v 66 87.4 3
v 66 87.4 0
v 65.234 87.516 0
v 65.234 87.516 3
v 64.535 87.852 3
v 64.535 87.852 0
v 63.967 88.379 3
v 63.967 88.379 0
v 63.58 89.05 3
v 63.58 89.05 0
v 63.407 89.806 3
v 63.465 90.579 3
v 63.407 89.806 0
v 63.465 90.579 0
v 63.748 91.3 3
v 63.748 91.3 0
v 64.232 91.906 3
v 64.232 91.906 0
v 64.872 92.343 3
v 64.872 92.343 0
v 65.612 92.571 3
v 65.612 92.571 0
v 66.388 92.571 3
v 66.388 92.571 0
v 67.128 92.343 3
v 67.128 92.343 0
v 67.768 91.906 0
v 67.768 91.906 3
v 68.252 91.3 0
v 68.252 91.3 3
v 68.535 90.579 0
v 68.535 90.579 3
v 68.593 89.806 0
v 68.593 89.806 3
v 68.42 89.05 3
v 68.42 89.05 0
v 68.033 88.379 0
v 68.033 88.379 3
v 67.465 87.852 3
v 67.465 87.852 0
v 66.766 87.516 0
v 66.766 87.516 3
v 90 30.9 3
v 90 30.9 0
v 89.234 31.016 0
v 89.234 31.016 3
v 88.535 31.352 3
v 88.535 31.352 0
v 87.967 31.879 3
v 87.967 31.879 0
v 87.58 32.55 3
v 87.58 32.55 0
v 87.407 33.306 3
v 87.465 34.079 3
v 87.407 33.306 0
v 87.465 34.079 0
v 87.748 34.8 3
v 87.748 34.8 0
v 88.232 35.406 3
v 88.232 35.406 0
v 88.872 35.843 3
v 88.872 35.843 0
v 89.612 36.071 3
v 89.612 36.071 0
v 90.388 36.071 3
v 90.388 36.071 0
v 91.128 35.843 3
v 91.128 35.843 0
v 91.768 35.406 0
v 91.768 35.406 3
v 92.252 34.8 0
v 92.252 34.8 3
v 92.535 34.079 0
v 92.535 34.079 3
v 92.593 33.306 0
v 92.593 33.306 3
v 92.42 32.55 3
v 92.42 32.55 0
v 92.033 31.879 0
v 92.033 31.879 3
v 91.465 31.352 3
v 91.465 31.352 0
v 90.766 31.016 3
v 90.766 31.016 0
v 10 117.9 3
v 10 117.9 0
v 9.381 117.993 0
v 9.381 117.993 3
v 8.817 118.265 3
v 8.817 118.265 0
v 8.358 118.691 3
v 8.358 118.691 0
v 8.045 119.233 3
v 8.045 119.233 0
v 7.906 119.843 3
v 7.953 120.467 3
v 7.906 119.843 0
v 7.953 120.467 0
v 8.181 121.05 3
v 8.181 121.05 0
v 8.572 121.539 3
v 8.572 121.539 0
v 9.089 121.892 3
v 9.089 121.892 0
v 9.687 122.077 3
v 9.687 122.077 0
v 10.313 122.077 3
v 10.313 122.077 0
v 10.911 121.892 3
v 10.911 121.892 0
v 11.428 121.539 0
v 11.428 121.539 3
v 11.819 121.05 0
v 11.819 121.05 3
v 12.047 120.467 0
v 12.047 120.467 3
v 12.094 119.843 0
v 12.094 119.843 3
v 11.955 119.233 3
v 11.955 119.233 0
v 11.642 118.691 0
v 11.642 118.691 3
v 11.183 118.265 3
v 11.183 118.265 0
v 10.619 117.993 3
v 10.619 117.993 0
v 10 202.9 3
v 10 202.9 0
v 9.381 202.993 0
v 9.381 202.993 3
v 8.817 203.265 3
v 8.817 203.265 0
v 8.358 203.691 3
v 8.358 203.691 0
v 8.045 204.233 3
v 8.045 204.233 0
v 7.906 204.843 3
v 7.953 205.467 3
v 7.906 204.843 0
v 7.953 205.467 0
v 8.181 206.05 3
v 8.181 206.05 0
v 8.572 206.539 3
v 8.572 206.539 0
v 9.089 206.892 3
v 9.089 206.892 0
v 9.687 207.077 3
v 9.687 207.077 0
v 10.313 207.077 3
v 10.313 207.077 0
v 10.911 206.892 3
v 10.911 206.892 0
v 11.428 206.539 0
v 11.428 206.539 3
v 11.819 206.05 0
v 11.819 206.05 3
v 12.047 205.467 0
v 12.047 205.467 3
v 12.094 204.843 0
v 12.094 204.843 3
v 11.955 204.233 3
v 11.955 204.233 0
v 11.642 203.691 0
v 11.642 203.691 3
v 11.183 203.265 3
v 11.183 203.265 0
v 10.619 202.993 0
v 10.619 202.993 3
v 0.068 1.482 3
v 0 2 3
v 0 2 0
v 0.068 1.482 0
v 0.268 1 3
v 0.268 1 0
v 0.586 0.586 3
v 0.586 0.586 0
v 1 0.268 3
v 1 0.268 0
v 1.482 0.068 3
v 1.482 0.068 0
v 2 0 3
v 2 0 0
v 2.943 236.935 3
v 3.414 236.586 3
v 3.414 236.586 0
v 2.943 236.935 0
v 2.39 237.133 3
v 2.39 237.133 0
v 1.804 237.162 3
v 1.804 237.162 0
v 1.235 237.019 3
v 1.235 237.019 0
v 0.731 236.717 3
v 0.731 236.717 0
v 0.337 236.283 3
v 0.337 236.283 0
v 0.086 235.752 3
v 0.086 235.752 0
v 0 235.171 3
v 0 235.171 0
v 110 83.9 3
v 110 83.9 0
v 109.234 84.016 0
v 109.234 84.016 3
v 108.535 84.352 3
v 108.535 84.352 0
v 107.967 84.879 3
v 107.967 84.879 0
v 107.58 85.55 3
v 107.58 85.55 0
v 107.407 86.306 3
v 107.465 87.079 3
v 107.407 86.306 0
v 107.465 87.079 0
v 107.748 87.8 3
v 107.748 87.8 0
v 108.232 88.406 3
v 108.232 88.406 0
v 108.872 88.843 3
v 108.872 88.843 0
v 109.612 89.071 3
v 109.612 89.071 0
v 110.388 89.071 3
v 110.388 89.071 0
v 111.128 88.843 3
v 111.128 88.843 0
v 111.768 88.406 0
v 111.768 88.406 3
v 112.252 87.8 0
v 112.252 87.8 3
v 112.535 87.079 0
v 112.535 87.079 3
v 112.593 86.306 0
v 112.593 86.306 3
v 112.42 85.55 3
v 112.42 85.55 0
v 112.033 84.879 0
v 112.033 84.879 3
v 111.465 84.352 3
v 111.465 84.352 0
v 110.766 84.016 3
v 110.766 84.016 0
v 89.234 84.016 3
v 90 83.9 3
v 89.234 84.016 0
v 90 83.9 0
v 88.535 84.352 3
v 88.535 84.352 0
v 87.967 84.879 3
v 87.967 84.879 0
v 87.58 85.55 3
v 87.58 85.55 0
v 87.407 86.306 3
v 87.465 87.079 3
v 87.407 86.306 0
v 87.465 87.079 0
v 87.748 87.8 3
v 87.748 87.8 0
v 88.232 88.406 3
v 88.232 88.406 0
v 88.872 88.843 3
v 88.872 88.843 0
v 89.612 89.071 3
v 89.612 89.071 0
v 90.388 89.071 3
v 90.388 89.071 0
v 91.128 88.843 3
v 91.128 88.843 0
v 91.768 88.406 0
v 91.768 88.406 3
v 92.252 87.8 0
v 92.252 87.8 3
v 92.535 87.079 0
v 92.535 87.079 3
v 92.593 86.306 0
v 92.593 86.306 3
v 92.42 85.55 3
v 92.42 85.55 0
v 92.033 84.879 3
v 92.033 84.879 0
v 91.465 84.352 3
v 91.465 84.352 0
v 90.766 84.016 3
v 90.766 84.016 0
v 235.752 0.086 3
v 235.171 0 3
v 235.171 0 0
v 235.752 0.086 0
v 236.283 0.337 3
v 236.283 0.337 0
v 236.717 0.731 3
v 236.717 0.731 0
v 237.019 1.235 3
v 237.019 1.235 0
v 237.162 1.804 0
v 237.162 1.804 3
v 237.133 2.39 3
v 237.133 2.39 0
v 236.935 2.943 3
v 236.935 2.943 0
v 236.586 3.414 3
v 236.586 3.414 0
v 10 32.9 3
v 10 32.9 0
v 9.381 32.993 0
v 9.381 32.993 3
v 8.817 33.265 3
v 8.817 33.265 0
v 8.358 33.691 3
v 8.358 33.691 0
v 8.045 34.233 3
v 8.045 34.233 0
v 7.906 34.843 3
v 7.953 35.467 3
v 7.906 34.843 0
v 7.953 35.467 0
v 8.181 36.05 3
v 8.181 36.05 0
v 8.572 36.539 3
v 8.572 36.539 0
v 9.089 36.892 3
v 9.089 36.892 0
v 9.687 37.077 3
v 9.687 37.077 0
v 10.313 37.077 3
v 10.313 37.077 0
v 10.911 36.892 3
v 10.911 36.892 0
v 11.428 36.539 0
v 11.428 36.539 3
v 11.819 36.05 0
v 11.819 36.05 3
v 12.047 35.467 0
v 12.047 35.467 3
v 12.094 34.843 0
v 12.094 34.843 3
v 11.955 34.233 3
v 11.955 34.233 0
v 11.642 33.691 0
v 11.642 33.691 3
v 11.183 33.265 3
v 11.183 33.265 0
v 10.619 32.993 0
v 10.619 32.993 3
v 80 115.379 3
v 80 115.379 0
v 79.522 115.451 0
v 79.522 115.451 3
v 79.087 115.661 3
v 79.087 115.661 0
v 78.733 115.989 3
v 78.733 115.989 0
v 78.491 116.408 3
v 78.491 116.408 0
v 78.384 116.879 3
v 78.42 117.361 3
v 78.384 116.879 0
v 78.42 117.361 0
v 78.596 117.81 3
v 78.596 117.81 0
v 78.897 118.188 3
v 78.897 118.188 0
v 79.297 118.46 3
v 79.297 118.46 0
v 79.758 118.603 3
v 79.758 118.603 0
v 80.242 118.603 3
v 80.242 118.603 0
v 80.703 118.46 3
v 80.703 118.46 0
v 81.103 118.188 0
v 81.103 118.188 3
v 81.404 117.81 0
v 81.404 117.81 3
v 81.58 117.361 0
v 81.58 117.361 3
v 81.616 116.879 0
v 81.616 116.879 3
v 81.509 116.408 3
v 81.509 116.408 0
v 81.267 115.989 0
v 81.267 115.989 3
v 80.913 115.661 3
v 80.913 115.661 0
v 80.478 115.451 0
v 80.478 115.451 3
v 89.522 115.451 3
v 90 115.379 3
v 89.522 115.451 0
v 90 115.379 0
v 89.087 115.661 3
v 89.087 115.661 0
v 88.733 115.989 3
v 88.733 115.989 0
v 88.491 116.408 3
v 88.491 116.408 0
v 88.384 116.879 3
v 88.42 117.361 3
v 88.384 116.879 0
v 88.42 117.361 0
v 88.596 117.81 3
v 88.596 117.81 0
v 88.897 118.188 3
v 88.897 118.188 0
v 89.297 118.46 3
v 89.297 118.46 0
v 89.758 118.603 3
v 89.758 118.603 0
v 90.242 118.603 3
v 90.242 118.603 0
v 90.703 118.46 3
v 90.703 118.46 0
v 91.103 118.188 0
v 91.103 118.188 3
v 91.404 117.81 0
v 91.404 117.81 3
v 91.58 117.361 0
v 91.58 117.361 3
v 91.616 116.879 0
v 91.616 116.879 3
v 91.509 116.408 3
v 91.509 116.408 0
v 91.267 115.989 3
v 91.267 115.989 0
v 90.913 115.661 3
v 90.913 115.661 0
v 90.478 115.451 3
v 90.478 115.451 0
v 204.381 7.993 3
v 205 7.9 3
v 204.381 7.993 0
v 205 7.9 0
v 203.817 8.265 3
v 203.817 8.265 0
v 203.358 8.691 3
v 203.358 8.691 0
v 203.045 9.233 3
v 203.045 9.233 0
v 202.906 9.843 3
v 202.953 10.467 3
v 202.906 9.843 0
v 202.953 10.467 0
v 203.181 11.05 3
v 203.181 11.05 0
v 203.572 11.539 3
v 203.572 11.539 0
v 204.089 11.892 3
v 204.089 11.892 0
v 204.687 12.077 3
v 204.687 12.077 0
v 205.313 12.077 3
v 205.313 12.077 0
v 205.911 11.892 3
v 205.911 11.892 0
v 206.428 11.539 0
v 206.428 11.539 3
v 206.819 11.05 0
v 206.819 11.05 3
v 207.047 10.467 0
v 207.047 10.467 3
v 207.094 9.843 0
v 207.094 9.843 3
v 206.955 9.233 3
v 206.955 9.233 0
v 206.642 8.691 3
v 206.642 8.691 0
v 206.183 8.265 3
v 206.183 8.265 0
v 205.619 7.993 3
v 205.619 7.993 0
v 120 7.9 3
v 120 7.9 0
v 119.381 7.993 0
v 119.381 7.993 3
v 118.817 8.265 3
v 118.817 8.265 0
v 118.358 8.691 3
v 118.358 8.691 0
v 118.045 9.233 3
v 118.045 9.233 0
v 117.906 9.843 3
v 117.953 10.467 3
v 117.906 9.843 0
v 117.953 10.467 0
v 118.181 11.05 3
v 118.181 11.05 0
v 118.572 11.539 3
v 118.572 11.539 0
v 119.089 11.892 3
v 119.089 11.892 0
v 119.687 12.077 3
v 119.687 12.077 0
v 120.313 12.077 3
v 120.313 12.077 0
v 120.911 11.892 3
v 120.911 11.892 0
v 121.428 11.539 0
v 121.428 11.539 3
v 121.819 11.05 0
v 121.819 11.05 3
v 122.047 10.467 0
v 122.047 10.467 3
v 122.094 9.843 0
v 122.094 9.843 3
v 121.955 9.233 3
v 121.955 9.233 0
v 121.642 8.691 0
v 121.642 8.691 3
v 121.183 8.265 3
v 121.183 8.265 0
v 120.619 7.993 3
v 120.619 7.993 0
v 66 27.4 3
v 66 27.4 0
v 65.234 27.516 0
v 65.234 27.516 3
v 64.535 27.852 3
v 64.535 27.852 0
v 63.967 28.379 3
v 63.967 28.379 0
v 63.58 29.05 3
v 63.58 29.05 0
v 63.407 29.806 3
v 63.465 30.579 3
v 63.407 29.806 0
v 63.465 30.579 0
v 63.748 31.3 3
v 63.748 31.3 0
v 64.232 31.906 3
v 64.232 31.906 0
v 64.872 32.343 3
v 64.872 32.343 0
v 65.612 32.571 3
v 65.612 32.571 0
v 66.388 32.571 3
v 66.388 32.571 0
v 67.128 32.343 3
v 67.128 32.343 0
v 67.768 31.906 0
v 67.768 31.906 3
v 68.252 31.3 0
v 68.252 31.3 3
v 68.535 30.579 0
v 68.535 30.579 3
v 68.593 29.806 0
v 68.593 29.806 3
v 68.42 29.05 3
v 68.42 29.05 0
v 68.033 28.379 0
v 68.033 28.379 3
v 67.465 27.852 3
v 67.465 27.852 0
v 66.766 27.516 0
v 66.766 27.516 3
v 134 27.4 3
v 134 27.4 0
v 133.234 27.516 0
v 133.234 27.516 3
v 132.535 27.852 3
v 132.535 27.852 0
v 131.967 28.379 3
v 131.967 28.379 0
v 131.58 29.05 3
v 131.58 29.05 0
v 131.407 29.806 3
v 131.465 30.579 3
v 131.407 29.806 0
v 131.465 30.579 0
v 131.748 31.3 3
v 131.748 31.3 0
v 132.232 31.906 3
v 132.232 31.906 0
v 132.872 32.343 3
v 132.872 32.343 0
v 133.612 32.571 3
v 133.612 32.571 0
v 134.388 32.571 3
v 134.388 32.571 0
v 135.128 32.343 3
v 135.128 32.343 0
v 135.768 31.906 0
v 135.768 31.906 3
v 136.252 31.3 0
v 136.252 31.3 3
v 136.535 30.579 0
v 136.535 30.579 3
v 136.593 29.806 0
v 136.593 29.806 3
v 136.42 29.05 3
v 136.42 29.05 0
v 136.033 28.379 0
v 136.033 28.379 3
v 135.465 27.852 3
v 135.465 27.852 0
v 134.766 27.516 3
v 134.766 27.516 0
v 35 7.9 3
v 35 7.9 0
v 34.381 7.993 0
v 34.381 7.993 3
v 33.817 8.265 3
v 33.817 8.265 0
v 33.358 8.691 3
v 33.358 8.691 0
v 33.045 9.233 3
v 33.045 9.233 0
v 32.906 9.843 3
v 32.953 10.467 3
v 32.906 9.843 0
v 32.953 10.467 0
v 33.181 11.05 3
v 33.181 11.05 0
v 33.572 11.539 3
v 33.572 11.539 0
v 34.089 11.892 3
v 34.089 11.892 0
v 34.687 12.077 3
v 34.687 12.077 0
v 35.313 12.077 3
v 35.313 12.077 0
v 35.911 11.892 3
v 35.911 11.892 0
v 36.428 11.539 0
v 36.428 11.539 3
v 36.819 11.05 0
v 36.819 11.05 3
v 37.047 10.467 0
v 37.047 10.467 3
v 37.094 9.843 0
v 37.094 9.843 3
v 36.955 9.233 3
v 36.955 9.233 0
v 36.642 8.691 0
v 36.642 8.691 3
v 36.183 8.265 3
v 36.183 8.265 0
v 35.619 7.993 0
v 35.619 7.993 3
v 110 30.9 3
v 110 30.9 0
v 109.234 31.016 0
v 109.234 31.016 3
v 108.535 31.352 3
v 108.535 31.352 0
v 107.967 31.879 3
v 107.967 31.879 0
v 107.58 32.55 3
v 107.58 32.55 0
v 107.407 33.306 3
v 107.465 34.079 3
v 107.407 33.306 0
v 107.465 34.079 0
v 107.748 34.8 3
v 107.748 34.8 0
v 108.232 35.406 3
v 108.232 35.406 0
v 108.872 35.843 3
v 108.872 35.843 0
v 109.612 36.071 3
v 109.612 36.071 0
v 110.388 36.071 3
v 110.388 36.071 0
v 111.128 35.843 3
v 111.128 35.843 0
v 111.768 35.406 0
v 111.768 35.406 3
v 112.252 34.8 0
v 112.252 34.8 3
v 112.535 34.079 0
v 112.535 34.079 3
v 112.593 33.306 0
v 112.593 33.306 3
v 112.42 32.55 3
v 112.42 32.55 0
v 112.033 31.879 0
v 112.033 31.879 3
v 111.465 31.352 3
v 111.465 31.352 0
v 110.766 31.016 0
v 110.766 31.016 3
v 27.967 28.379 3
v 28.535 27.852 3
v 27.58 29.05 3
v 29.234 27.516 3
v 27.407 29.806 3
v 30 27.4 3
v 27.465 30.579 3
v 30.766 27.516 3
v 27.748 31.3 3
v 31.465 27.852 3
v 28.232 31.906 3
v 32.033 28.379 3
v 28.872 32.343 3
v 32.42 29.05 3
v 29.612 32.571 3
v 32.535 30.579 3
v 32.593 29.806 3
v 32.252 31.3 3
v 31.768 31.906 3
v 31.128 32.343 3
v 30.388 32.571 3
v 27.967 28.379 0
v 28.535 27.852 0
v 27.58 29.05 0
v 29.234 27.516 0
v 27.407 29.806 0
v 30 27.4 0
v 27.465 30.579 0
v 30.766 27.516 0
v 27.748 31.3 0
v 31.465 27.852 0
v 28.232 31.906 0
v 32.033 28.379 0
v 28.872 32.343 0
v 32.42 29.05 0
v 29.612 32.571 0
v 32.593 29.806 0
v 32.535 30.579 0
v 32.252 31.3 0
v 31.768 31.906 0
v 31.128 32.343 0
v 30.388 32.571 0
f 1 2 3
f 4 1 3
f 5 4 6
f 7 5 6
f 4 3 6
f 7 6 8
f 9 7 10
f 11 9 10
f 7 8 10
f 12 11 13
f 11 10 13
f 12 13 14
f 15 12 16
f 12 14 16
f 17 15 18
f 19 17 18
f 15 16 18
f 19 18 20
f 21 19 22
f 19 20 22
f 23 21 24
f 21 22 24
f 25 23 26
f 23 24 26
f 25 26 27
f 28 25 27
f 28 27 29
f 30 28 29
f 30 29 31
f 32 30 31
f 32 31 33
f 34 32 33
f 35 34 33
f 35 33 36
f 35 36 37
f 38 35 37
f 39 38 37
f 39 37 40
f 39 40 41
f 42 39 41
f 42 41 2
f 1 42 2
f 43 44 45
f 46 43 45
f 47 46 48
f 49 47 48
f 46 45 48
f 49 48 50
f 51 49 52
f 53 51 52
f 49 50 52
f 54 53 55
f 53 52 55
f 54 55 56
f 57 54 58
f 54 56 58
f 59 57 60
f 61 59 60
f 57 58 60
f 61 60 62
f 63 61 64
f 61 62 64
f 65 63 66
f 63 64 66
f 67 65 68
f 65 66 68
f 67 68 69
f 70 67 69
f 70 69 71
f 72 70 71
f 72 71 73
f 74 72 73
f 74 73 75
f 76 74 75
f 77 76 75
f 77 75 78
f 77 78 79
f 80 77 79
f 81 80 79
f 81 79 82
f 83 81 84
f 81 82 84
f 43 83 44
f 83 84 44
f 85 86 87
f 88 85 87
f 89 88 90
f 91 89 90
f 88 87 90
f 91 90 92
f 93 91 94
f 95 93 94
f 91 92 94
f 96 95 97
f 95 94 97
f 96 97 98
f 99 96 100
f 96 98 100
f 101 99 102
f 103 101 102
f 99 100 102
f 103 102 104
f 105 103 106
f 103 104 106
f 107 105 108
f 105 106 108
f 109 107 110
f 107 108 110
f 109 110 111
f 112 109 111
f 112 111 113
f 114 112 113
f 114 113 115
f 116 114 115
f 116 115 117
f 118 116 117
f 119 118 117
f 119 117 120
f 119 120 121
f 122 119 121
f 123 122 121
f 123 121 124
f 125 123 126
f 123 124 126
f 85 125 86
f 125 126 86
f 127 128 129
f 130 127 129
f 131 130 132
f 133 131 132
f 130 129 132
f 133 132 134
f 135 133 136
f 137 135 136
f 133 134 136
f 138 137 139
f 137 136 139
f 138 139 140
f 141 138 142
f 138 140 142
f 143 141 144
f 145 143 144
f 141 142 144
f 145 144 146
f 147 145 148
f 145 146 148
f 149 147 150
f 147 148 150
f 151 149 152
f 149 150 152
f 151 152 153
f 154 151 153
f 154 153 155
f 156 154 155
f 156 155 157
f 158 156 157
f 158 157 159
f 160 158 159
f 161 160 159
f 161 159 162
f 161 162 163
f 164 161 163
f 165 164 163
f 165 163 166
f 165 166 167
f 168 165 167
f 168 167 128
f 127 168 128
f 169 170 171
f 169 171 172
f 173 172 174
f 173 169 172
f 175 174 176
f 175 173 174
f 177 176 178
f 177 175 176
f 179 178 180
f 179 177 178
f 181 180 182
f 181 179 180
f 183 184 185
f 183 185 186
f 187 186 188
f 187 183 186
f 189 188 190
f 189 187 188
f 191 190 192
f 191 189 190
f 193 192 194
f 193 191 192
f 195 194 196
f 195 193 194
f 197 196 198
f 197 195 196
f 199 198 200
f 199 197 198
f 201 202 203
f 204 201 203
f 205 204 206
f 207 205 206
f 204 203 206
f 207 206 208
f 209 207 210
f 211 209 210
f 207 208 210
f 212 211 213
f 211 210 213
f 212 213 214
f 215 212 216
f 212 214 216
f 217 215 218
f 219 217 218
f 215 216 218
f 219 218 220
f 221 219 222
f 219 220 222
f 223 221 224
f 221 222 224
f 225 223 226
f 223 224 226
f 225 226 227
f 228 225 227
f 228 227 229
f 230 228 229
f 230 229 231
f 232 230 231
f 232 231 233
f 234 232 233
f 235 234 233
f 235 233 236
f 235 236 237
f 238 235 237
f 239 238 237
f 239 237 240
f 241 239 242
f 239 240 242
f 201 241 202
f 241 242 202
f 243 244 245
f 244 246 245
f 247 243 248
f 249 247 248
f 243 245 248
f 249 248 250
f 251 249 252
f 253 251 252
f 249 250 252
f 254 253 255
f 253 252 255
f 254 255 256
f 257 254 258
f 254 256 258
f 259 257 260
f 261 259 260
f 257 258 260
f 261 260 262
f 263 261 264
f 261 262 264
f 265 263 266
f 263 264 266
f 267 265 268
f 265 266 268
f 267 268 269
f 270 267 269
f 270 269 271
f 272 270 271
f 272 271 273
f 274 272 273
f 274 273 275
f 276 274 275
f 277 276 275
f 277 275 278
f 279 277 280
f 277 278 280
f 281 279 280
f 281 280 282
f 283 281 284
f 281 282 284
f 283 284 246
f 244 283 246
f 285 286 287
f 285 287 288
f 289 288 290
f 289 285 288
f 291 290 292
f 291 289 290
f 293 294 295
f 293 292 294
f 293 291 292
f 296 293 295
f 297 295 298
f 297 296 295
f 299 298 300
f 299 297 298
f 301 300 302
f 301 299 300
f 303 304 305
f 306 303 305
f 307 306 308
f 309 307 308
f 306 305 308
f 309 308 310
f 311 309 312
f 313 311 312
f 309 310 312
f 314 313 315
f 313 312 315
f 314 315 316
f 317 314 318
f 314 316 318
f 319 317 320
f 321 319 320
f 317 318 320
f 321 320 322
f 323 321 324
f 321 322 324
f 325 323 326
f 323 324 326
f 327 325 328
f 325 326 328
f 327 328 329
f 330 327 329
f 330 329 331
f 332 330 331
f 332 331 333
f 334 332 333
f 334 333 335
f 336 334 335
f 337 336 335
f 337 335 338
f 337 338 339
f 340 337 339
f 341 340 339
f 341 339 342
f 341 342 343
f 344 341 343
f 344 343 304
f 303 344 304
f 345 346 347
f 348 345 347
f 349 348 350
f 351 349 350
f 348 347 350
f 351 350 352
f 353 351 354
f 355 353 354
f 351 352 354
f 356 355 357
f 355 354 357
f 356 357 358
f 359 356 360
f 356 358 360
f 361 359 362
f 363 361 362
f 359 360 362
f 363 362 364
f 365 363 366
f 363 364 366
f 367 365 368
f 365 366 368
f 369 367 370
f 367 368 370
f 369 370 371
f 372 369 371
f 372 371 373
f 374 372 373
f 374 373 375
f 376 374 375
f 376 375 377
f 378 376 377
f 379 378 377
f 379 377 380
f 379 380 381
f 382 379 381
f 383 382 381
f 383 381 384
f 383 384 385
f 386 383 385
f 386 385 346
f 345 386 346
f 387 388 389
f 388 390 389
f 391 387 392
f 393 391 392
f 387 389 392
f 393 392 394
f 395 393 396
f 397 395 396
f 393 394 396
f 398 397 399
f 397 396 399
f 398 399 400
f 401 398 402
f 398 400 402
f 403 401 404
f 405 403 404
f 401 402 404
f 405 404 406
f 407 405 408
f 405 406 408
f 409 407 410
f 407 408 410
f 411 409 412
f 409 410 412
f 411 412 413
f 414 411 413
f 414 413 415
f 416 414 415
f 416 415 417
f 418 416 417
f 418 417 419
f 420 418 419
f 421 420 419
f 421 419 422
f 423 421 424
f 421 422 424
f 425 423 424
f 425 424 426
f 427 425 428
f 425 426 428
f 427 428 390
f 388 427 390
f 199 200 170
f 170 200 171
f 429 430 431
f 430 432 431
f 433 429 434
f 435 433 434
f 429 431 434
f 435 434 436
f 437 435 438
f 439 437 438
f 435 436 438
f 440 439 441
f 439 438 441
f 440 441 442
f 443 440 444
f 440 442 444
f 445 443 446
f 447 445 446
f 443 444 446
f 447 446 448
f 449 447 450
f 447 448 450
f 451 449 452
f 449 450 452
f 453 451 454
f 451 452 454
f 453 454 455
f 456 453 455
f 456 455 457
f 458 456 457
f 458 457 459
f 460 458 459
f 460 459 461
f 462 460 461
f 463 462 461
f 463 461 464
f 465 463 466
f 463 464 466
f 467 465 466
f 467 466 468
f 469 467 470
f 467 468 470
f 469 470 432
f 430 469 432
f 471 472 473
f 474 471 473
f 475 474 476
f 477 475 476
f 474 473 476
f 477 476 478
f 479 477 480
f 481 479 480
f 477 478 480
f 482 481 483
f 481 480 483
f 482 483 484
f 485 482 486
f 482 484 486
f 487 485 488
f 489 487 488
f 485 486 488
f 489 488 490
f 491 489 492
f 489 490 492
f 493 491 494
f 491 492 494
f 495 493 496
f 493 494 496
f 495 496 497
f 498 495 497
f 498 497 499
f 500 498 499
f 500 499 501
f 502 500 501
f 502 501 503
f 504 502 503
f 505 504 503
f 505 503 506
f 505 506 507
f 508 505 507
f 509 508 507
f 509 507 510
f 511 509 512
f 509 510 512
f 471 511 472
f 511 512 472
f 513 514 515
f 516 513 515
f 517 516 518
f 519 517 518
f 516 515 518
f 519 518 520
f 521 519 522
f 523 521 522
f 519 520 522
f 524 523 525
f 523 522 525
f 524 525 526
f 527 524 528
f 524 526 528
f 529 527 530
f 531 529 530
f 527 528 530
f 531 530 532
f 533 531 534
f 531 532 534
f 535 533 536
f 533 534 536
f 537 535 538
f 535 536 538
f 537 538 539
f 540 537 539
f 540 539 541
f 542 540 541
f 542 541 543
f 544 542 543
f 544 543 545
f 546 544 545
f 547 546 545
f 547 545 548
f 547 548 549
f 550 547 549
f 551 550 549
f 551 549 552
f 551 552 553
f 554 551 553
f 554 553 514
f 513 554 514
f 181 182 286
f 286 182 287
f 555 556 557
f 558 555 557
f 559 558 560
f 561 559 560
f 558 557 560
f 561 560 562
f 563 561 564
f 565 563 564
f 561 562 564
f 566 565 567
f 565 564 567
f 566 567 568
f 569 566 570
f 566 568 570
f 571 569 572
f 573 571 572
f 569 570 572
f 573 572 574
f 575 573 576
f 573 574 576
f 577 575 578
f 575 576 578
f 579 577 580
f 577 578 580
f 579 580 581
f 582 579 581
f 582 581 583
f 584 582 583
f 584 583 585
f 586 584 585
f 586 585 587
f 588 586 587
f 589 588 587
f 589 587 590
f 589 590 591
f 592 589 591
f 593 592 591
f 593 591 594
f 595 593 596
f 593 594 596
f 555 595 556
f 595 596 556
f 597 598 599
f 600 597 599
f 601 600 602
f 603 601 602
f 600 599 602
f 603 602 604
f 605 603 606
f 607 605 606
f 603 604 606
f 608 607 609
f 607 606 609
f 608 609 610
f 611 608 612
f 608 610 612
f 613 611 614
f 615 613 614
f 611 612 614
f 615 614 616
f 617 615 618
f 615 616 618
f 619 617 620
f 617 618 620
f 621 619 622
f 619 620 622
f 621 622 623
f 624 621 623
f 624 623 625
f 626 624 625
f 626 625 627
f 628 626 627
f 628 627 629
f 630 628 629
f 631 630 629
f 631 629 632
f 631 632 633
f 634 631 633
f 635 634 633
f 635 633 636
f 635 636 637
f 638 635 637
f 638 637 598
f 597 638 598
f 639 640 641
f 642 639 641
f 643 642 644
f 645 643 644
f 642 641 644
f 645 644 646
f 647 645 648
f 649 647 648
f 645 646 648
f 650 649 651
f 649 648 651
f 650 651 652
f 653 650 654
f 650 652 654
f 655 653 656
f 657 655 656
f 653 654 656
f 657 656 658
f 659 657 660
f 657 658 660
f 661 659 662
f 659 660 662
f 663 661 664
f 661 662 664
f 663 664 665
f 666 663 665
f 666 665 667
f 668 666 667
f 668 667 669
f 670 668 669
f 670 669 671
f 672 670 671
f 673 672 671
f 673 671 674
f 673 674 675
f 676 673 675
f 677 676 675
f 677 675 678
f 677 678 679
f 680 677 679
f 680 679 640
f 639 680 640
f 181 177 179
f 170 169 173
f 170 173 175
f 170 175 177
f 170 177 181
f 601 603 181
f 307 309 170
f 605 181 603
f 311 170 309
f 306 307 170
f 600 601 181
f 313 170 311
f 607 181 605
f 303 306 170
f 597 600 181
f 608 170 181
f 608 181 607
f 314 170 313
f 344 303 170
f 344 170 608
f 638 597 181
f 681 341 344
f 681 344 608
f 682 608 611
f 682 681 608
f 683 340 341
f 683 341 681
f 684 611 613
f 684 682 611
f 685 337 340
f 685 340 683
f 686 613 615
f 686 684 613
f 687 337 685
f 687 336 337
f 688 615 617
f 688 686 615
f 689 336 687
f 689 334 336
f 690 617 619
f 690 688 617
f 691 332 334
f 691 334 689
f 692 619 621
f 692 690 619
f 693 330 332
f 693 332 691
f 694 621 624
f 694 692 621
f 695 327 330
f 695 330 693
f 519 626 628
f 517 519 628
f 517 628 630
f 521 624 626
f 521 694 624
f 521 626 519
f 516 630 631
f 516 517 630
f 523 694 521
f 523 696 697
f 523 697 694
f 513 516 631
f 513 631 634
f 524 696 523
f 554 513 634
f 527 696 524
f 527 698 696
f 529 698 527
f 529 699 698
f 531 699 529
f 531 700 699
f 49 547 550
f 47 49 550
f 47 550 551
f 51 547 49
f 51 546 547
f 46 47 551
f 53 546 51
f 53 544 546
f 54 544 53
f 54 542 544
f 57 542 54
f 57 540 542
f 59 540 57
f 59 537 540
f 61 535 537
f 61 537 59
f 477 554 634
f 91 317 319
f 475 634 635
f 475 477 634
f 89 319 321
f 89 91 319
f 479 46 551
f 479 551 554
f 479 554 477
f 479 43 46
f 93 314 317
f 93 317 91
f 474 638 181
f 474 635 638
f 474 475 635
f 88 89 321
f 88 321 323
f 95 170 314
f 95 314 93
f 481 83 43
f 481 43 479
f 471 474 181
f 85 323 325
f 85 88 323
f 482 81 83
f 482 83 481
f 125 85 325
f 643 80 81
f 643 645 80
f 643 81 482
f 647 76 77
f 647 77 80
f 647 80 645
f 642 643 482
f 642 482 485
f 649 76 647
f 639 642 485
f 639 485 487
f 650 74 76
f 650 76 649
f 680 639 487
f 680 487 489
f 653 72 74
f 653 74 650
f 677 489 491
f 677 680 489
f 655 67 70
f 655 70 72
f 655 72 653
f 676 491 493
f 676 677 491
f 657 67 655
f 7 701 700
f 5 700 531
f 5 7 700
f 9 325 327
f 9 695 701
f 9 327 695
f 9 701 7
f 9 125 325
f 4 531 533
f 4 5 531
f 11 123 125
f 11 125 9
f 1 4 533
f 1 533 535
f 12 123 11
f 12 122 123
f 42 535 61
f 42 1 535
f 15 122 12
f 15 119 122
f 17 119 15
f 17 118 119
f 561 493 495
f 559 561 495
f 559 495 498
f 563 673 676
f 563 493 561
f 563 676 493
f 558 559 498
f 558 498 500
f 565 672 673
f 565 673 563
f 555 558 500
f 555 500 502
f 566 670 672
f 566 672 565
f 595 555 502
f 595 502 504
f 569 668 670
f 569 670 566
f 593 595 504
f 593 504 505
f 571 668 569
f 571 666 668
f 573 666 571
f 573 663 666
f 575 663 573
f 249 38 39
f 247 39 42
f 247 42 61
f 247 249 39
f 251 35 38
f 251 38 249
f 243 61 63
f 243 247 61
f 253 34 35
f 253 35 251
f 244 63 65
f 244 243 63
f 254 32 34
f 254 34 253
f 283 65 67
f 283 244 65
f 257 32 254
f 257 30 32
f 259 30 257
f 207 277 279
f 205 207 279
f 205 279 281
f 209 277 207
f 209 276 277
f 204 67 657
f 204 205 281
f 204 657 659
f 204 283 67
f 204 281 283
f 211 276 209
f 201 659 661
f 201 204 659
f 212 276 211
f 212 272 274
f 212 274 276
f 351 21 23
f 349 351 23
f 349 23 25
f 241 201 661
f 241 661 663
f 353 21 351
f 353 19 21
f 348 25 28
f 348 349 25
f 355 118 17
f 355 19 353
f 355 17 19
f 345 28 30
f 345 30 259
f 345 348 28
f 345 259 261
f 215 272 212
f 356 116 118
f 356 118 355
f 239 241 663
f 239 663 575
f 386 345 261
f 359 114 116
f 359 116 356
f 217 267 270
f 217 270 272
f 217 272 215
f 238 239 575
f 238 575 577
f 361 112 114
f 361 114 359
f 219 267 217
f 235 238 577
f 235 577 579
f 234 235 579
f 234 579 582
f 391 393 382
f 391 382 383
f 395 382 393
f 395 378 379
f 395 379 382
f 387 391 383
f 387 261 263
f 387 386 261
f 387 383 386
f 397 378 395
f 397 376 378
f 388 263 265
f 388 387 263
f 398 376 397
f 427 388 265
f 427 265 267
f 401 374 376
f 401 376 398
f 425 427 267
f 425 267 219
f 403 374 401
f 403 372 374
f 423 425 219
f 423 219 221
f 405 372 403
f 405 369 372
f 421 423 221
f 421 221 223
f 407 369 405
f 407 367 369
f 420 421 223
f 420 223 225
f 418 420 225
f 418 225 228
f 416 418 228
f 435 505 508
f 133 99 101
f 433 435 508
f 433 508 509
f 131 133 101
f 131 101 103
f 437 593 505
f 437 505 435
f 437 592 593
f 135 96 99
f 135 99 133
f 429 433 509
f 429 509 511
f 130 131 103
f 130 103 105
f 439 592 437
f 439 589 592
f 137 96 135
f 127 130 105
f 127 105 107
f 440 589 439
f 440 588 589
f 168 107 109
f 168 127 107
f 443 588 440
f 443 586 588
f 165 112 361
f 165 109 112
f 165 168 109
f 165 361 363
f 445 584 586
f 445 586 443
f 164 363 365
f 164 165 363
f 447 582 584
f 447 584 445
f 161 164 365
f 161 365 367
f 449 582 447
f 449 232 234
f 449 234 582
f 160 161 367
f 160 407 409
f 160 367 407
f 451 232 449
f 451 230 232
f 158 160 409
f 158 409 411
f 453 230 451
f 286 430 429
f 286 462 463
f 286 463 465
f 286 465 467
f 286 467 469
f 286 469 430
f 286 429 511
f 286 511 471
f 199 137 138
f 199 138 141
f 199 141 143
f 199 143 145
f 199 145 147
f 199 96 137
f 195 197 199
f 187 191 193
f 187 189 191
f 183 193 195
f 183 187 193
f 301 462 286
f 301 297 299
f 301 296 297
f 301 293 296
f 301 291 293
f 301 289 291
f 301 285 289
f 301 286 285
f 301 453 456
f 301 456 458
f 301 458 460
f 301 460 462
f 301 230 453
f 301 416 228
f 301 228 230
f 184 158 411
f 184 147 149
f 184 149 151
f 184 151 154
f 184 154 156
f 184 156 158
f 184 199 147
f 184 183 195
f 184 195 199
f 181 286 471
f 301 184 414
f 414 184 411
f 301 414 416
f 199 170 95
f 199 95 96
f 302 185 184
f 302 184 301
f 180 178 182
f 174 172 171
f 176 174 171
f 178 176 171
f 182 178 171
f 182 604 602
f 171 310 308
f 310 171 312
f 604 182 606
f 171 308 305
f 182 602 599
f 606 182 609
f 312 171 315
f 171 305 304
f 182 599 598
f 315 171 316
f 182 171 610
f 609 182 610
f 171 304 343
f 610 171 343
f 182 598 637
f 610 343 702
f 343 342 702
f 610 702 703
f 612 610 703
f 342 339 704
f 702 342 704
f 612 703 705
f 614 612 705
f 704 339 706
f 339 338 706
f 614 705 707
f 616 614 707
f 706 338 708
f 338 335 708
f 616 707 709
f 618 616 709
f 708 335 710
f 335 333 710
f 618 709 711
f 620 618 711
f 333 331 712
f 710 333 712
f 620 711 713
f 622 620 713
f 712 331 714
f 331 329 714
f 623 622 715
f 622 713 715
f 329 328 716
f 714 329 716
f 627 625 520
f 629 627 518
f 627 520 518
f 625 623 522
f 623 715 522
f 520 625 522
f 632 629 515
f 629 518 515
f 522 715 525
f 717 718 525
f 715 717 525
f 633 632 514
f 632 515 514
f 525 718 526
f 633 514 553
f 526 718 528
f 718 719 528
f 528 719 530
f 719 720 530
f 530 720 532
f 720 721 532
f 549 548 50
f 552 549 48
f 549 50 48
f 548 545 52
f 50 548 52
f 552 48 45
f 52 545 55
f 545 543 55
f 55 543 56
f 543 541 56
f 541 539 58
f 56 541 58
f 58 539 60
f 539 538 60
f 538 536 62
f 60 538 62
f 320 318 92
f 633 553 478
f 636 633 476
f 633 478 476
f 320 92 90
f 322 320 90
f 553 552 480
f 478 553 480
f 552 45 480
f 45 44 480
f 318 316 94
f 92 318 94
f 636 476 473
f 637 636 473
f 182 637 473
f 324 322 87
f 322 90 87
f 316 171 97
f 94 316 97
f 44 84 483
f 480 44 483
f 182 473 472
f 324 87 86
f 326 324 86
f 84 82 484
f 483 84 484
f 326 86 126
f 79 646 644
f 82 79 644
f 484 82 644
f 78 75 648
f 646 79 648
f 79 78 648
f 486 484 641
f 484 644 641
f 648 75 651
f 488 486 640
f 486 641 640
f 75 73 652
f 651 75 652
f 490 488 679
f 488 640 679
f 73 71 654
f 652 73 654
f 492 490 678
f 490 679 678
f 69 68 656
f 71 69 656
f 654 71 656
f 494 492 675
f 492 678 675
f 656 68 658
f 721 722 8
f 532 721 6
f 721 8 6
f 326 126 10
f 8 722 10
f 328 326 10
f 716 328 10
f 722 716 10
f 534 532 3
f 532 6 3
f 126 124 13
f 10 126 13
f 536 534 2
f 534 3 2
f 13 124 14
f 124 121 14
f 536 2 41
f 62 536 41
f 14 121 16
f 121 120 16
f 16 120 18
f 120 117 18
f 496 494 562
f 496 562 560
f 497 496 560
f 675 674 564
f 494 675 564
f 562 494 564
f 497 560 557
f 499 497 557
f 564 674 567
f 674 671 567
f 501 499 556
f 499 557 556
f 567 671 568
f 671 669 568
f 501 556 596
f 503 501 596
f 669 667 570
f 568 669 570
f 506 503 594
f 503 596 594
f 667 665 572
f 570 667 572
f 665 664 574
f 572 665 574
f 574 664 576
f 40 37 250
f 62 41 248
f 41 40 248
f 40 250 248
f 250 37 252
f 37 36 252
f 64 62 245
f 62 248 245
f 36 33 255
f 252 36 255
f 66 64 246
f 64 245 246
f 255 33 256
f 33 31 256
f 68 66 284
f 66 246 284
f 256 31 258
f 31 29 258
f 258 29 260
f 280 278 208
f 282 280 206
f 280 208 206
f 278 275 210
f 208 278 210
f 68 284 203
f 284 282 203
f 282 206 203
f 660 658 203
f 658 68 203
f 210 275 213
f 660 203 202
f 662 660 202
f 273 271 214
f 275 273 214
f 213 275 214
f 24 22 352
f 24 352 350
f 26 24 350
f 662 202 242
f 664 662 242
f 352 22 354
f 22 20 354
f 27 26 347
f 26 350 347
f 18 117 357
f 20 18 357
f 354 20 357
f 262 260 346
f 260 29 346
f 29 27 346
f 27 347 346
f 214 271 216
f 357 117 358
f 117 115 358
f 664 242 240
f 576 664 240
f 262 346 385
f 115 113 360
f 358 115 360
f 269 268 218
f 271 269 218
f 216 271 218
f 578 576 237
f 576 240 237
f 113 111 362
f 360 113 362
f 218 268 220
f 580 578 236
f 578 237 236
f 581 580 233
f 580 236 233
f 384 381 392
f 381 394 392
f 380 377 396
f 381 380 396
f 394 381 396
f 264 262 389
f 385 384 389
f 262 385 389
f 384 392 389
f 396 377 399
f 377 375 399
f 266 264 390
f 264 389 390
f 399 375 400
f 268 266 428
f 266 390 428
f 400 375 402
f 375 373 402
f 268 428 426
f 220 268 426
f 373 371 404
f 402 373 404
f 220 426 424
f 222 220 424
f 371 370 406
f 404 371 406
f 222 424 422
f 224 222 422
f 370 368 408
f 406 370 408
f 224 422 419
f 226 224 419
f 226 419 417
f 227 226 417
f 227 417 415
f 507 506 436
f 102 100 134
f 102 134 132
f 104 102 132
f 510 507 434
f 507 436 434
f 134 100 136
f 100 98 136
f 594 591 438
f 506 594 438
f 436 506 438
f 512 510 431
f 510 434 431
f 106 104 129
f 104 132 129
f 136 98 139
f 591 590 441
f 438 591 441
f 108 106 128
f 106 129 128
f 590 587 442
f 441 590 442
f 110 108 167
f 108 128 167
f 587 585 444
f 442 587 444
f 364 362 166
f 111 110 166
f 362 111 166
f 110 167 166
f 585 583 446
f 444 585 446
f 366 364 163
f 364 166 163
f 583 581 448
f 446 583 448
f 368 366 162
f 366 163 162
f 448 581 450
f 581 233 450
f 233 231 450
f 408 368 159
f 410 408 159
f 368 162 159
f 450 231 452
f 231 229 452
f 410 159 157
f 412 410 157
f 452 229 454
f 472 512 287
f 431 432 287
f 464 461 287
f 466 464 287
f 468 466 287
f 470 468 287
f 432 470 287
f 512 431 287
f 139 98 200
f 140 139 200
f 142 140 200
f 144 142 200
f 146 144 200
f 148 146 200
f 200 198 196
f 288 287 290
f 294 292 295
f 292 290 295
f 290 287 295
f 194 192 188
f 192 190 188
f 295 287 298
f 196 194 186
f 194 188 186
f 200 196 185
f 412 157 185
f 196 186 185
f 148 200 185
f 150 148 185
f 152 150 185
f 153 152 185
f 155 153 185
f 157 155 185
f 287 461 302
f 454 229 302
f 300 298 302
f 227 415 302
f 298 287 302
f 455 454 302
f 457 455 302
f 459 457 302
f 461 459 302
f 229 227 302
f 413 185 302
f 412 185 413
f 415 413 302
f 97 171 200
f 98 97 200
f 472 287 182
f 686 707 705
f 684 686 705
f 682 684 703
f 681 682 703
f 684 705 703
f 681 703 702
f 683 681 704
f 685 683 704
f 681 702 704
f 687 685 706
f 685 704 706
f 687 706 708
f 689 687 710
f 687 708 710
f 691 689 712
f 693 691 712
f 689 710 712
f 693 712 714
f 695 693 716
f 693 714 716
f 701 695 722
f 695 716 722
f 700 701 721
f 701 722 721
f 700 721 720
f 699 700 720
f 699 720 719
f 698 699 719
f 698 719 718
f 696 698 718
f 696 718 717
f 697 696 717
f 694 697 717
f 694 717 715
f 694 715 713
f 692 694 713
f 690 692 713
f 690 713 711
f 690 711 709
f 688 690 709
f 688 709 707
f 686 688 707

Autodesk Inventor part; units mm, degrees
ref_plane "YZ Plane" through (0, 0, 0) normal (1, 0, 0) x (0, 1, 0)
ref_plane "XZ Plane" through (0, 0, 0) normal (0, 1, 0) x (-1, 0, 0)
ref_plane "XY Plane" through (0, 0, 0) normal (0, 0, 1) x (1, 0, 0)
sketch "スケッチ1" plane through (0, 0, 0) normal (0, 0, 1) x (1, 0, 0)
  line L0 (0, 0) -> (239.9998, 0)
  line L1 (239.9998, 0) -> (239.9998, 239.9998)
  line L2 (239.9998, 239.9998) -> (0, 239.9998)
  line L3 (0, 239.9998) -> (0, 0)
  line L4 (0, 239.9998) -> (239.9998, 0)
  line L5 (-178.706, 178.706) -> (151.9787, -151.9787)
  dimension "d16" = 45
  dimension "d17" = 169.7055
extrude "プレート1" add sketch "スケッチ1" along normal blind 3 contours L3 L4 L0
sketch "スケッチ2" plane through (0, 0, 3) normal (0, 0, 1) x (1, 0, 0)
  line L0 (90, 33.5) -> (110, 33.5)
  line L1 (110, 33.5) -> (110, 86.5)
  line L2 (110, 86.5) -> (90, 86.5)
  line L3 (90, 86.5) -> (90, 33.5)
  line L4 (90, 33.5) -> (110, 86.5) construction
  line L5 (110, 33.5) -> (90, 86.5) construction
  line L6 (239.9998, 0) -> (0, 0) projected
  line L7 (0, 0) -> (0, 239.9998) projected
  line L8 (134, 30) -> (66, 30)
  line L9 (66, 30) -> (66, 90)
  line L10 (66, 90) -> (134, 90)
  line L11 (134, 90) -> (134, 30)
  line L12 (134, 30) -> (66, 90) construction
  line L13 (66, 30) -> (134, 90) construction
  point P0 (100, 60)
  dimension "d3" = 20
  dimension "d4" = 53
  dimension "d5" = 60
  dimension "d6" = 100
  dimension "d14" = 60
  dimension "d15" = 68
hole "穴1" at (90, 33.5, 3) at (110, 33.5, 3) at (90, 86.5, 3) at (110, 86.5, 3) at (66, 30, 3) at (134, 30, 3) at (66, 90, 3) direction (0, 0, -1) diameter 5.2 depth 3 tip angle 118
fillet "フィレット1" radius 2 3 edges at (0, 239.9998, 1.5) (0, 0, 1.5) (239.9998, 0, 1.5)
sketch "スケッチ3" plane through (0, 0, 3) normal (0, 0, 1) x (1, 0, 0)
  circle A0 centre (66, 90) radius 2.6 projected
  line L0 (0, 2) -> (0, 235.1714) projected
  point P0 (0, 0)
  point P1 (90, 117)
  point P2 (80, 117)
  dimension "d19" = 10
  dimension "d20" = 27
  dimension "d21" = 80
hole "穴2" at (90, 117, 3) at (80, 117, 3) direction (0, 0, -1) diameter 3.242 depth 11.8 tip angle 118 thread size "M4x0.7" class "6H" standard "ISO Metric profile"
sketch "スケッチ4" plane through (0, 0, 3) normal (0, 0, 1) x (1, 0, 0)
  circle A0 centre (90, 117) radius 1.621 projected
  circle A1 centre (80, 117) radius 1.621 projected
  arc A2 (235.1714, 0) -> (236.5856, 3.4142) centre (235.1714, 2) ccw projected
  line L0 (3.4142, 236.5856) -> (236.5856, 3.4142) projected
  arc A3 (3.4142, 236.5856) -> (0, 235.1714) centre (2, 235.1714) ccw projected
  line L1 (0, 2) -> (0, 235.1714) projected
  arc A4 (0, 2) -> (2, 0) centre (2, 2) ccw projected
  line L2 (235.1714, 0) -> (2, 0) projected
  circle A5 centre (134, 30) radius 2.6 projected
  circle A6 centre (110, 86.5) radius 2.6 projected
  circle A7 centre (110, 33.5) radius 2.6 projected
  circle A8 centre (90, 33.5) radius 2.6 projected
  circle A9 centre (90, 86.5) radius 2.6 projected
  circle A10 centre (66, 30) radius 2.6 projected
  circle A11 centre (66, 90) radius 2.6 projected
  line L3 (10, 10) -> (10, 215.8577)
  line L4 (10, 215.8577) -> (215.8577, 10)
  line L5 (215.8577, 10) -> (10, 10)
  point P0 (0, 0)
  point P1 (205, 10)
  point P2 (35, 10)
  point P3 (10, 35)
  point P4 (10, 205)
  point P5 (120, 10)
  point P6 (10, 120)
  dimension "d29" = 10
  dimension "d30" = 25
  dimension "d31" = 25
  dimension "d32" = 170
  dimension "d33" = 170
  dimension "d34" = 85
  dimension "d35" = 85
hole "穴3" at (205, 10, 3) at (35, 10, 3) at (10, 35, 3) at (10, 205, 3) at (120, 10, 3) at (10, 120, 3) direction (0, 0, -1) diameter 4.2 depth 3 tip angle 118
sketch "スケッチ6" plane through (0, 0, 3) normal (0, 0, 1) x (1, 0, 0)
  circle A0 centre (120, 10) radius 2.1 projected
  circle A1 centre (10, 35) radius 2.1 projected
  circle A2 centre (205, 10) radius 2.1 projected
  circle A3 centre (35, 10) radius 2.1 projected
  circle A4 centre (10, 205) radius 2.1 projected
  circle A5 centre (10, 120) radius 2.1 projected
  circle A6 centre (90, 117) radius 1.621 projected
  circle A7 centre (80, 117) radius 1.621 projected
  arc A8 (235.1714, 0) -> (236.5856, 3.4142) centre (235.1714, 2) ccw projected
  line L0 (3.4142, 236.5856) -> (236.5856, 3.4142) projected
  arc A9 (3.4142, 236.5856) -> (0, 235.1714) centre (2, 235.1714) ccw projected
  line L1 (0, 2) -> (0, 235.1714) projected
  arc A10 (0, 2) -> (2, 0) centre (2, 2) ccw projected
  line L2 (235.1714, 0) -> (2, 0) projected
  circle A11 centre (134, 30) radius 2.6 projected
  circle A12 centre (110, 86.5) radius 2.6 projected
  circle A13 centre (110, 33.5) radius 2.6 projected
  circle A14 centre (90, 33.5) radius 2.6 projected
  circle A15 centre (90, 86.5) radius 2.6 projected
  circle A16 centre (66, 30) radius 2.6 projected
  circle A17 centre (66, 90) radius 2.6 projected
  line L3 (20, 20) -> (20, 191.7155)
  line L4 (20, 191.7155) -> (191.7155, 20)
  line L5 (191.7155, 20) -> (20, 20)
  point P0 (0, 0)
  point P1 (30, 30)
  dimension "d46" = 20
  dimension "d47" = 10
  dimension "d48" = 10
hole "穴4" at (30, 30, 3) direction (0, 0, -1) diameter 5.2 depth 3 tip angle 118
equation "\"d12\" = Thickness"
equation "\"d41\" = Thickness"
equation "\"d54\" = Thickness"
equation "\"d2\" = Thickness"
equation "\"BendRadius\" = Thickness"
equation "\"BendReliefWidth\" = Thickness"
equation "\"BendReliefDepth\" = 0.5 * Thickness"
equation "\"CornerReliefSize\" = 4 * Thickness"
equation "\"MinimumRemnant\" = 2 * Thickness"
equation "\"TransitionRadius\" = BendRadius"
equation "\"JacobiRadiusSize\" = BendRadius"
equation "\"GapSize\" = Thickness"
equation "\"Thickness\" = 3"
properties part number "Display_CCM_Mount"
